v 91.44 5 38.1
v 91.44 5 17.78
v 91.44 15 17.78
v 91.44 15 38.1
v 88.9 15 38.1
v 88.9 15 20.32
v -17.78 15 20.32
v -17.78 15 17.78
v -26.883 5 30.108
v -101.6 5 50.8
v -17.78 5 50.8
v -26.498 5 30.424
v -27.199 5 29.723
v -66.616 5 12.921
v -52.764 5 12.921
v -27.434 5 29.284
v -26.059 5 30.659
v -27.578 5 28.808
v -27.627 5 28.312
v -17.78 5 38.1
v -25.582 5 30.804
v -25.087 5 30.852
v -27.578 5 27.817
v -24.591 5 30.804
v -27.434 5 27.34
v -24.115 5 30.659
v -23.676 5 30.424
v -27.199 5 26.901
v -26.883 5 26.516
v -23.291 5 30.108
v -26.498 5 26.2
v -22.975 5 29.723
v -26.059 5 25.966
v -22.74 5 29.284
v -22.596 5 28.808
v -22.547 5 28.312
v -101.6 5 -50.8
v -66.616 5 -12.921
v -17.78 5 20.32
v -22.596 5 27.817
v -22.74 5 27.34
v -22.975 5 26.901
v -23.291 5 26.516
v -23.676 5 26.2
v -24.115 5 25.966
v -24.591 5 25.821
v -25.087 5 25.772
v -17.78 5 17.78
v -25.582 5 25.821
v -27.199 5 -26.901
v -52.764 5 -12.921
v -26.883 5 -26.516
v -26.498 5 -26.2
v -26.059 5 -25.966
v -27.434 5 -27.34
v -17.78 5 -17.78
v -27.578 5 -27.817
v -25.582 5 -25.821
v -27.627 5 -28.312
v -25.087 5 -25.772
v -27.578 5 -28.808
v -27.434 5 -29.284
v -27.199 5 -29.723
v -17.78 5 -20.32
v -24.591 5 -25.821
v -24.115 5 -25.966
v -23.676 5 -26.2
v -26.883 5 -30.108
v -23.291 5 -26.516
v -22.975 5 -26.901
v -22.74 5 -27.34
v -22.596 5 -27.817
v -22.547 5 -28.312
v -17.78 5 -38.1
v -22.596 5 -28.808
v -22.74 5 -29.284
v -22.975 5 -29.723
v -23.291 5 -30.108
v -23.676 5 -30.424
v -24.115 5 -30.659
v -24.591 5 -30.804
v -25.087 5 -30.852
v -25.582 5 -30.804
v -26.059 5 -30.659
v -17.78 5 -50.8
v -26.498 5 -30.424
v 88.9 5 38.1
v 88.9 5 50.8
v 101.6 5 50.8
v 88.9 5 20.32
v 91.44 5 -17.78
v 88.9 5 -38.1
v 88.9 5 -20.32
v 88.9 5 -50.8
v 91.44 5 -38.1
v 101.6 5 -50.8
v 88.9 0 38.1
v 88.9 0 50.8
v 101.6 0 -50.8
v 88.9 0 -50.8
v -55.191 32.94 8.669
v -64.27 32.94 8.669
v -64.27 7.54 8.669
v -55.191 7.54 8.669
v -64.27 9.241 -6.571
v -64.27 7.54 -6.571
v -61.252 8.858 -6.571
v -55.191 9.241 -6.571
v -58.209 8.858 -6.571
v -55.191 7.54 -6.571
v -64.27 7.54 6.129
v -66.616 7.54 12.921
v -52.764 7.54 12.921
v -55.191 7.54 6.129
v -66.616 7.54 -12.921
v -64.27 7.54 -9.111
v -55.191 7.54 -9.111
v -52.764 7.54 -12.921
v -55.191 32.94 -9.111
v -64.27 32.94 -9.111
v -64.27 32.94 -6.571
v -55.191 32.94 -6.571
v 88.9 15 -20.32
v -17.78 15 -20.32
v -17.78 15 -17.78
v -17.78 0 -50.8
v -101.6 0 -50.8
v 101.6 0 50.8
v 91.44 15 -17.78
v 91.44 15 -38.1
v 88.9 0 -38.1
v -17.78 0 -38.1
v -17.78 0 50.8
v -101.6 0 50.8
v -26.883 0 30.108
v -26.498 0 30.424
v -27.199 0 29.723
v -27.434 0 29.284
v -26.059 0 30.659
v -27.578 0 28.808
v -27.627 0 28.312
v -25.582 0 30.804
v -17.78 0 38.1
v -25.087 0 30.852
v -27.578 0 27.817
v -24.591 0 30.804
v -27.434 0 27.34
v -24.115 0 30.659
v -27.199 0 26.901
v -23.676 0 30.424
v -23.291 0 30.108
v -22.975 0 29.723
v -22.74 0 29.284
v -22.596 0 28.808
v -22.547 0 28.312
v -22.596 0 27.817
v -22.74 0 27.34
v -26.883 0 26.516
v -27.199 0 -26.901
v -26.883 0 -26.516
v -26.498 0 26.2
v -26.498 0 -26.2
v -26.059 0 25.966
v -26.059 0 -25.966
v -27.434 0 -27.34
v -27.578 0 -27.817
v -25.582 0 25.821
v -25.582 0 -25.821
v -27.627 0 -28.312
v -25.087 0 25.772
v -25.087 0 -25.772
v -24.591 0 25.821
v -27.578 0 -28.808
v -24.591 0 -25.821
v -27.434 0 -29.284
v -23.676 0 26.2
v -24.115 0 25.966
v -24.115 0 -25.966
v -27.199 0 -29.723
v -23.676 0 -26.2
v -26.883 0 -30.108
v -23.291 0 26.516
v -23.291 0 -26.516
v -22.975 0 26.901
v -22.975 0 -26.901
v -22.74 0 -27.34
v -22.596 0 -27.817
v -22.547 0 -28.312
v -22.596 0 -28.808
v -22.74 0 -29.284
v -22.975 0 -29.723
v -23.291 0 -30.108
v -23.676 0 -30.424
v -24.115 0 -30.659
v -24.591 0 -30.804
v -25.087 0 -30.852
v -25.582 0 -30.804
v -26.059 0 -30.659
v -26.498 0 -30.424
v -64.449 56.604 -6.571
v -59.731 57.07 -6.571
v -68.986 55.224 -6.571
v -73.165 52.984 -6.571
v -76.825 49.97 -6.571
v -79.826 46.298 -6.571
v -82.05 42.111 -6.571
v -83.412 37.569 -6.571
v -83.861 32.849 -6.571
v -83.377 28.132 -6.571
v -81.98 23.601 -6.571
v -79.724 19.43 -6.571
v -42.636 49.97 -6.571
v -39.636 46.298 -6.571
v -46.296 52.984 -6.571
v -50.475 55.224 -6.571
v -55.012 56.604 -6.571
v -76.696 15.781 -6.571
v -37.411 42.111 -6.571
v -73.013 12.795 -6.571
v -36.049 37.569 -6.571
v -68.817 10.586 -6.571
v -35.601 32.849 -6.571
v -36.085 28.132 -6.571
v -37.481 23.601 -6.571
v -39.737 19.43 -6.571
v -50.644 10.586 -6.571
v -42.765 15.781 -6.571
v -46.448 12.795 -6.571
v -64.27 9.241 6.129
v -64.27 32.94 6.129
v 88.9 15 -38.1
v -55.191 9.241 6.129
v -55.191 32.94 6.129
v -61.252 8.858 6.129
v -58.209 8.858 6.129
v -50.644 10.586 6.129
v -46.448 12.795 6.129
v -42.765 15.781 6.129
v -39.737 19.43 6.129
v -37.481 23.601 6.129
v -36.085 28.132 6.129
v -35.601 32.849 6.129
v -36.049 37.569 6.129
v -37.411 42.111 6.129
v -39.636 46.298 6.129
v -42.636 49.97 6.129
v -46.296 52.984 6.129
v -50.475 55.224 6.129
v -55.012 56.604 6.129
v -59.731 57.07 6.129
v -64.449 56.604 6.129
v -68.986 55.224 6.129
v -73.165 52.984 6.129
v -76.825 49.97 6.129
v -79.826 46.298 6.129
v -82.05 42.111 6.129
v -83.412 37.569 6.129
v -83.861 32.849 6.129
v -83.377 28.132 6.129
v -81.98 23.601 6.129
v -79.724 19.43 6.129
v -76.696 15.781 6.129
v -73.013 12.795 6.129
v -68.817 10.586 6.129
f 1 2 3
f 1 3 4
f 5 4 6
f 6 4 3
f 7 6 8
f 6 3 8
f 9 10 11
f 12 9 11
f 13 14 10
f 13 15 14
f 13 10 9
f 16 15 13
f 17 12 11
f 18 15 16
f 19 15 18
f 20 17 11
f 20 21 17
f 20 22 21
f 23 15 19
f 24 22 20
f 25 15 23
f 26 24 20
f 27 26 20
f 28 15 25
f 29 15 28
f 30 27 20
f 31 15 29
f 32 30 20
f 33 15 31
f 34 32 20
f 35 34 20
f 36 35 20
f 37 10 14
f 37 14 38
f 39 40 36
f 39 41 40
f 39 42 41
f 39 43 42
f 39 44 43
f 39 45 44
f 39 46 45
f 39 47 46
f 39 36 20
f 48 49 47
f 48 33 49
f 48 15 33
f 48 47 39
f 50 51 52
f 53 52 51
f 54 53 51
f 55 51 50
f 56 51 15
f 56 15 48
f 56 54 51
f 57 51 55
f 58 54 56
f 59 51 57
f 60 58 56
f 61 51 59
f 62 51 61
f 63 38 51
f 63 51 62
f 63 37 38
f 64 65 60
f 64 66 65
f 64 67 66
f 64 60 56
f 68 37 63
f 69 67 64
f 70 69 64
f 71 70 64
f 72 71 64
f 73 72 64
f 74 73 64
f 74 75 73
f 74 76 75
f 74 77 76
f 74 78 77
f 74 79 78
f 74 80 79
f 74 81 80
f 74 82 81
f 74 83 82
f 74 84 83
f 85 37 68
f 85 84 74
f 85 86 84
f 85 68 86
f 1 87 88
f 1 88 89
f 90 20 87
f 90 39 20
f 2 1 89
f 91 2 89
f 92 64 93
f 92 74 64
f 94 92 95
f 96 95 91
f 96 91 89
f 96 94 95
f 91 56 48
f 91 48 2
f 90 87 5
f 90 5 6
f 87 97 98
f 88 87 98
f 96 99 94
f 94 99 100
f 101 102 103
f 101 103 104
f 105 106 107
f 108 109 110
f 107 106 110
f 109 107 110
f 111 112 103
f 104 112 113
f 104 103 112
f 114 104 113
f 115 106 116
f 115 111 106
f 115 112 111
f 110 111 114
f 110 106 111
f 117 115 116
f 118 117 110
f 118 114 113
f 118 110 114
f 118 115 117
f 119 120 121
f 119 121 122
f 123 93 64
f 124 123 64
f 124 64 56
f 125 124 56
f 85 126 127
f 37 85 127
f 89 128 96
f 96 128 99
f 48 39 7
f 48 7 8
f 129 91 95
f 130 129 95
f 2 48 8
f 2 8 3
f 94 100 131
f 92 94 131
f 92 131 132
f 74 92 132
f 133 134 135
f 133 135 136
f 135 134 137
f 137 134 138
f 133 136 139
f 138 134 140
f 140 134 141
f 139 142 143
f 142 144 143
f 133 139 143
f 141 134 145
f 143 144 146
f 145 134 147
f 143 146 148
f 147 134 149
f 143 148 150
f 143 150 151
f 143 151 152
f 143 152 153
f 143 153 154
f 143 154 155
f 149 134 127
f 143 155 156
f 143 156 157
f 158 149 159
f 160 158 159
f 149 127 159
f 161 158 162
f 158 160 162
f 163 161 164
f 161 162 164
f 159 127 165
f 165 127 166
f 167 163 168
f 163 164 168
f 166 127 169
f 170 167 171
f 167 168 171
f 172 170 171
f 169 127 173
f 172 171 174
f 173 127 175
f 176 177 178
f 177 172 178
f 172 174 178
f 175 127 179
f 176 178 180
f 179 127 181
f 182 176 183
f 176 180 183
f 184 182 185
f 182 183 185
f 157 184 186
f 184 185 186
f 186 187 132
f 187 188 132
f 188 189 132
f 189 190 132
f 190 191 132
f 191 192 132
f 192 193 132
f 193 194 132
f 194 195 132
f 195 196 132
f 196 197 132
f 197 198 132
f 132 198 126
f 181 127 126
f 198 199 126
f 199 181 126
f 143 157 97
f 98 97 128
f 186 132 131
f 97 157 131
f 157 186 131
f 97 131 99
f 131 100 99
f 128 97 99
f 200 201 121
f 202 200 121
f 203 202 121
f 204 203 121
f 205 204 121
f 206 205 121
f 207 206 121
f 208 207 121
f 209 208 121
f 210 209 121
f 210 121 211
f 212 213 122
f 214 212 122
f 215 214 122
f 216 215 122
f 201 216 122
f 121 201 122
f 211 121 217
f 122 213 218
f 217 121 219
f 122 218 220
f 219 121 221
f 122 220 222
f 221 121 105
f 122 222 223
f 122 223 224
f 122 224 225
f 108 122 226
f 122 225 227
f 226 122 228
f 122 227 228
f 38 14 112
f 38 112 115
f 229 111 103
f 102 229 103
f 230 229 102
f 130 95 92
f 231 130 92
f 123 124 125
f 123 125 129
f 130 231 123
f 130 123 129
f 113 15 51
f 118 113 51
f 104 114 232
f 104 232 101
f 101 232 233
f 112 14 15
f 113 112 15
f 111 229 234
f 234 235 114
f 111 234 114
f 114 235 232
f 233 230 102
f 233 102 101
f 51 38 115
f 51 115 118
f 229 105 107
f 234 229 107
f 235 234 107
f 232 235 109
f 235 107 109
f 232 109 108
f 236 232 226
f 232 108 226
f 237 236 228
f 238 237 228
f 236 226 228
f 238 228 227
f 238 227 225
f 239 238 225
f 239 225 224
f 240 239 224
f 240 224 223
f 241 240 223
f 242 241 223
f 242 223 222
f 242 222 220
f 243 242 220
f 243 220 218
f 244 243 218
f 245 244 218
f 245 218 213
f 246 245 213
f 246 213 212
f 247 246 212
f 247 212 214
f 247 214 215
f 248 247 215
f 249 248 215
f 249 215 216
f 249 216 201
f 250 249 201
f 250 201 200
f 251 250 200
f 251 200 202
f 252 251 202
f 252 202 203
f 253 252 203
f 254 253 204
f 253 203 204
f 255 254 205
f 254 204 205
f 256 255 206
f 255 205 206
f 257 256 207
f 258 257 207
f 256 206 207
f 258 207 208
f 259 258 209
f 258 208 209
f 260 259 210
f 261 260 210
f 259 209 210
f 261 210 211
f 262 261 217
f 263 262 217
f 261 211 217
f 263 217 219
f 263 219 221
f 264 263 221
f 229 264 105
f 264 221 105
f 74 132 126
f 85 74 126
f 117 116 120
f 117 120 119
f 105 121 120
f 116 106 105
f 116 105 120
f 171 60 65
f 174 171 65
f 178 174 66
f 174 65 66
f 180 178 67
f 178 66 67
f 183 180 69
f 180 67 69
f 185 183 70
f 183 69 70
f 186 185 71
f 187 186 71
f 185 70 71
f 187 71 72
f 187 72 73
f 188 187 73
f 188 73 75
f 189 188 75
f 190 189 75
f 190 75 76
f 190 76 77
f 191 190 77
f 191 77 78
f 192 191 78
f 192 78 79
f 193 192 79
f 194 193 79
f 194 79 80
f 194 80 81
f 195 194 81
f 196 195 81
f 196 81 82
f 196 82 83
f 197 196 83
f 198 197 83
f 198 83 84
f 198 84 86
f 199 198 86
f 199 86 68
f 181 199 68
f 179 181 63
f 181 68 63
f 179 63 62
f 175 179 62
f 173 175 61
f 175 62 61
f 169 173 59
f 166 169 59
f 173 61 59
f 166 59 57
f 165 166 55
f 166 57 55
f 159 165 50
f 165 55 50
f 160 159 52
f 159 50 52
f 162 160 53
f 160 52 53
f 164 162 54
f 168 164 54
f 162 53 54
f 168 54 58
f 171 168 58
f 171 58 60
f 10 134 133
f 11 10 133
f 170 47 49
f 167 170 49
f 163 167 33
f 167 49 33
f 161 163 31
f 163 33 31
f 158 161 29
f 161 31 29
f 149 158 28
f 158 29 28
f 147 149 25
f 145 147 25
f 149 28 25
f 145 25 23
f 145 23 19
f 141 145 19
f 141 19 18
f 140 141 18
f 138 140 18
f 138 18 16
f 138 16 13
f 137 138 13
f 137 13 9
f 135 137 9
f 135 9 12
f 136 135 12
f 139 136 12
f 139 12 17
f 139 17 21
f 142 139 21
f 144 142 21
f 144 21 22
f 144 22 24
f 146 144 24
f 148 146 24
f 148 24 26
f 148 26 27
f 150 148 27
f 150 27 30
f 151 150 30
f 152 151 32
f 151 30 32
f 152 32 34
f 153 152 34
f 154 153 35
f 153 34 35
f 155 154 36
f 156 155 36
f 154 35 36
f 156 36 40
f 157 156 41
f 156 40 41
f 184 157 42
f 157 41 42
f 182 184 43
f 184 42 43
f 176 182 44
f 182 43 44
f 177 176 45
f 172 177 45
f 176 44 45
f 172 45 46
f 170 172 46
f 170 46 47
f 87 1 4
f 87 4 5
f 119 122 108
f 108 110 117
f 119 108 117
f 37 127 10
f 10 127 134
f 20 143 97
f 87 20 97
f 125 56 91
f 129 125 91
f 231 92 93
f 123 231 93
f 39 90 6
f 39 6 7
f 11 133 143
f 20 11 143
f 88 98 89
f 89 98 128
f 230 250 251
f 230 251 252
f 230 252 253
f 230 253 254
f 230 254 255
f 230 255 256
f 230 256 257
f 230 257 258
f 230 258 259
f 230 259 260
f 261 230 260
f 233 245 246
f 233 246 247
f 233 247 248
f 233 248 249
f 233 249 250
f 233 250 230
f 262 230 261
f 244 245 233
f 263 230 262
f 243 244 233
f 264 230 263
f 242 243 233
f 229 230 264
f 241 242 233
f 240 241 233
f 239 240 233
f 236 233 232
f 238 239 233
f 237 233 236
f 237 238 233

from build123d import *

# Parameters (mm, degrees)
BOSS_EXTRUDE1_DEPTH  = 5
BOSS_EXTRUDE2_DEPTH  = 10
SKETCH3_R            = 2.54
CUT_EXTRUDE1_DEPTH   = 115.031574575
SKETCH5_W            = 13.851899184
SKETCH5_H            = 25.842671822
BOSS_EXTRUDE3_DEPTH  = 2.54
SKETCH6_W            = 9.079065489
SKETCH6_H            = 2.54
BOSS_EXTRUDE7_DEPTH  = 25.4
SKETCH9_R            = 24.13
BOSS_EXTRUDE10_DEPTH = 12.7
SKETCH12_W           = 9.079065489
SKETCH12_H           = 25.611184956
BOSS_EXTRUDE11_DEPTH = 2.54


with BuildPart() as part:
    # Sketch1 → Boss-Extrude1 (new body)
    with BuildSketch(Plane(origin=(0, 0, 0), x_dir=(1, 0, 0), z_dir=(0, 1, 0))):
        Polygon((101.6, 50.8), (88.9, 50.8), (88.9, 38.1), (-17.78, 38.1), (-17.78, 50.8), (-101.6, 50.8), (-101.6, -50.8), (-17.78, -50.8), (-17.78, -38.1), (88.9, -38.1), (88.9, -50.8), (101.6, -50.8), align=None)
    extrude(amount=BOSS_EXTRUDE1_DEPTH)

    # Sketch2 → Boss-Extrude2 (add)
    with BuildSketch(Plane(origin=(0, 5, 0), x_dir=(1, 0, 0), z_dir=(0, 1, 0))):
        Polygon((88.9, -38.1), (88.9, -20.32), (-17.78, -20.32), (-17.78, -17.78), (91.44, -17.78), (91.44, -38.1), align=None)
        Polygon((91.44, 17.78), (91.44, 38.1), (88.9, 38.1), (88.9, 20.32), (-17.78, 20.32), (-17.78, 17.78), align=None)
    extrude(amount=BOSS_EXTRUDE2_DEPTH)

    # Sketch3 → Cut-Extrude1 (cut, through all)
    with BuildSketch(Plane(origin=(0, 5, 0), x_dir=(1, 0, 0), z_dir=(0, 1, 0))):
        with Locations((-25.086891482, 28.312348959)):
            Circle(SKETCH3_R)
        with Locations((-25.086891482, -28.312348959)):
            Circle(SKETCH3_R)
    extrude(amount=-CUT_EXTRUDE1_DEPTH, mode=Mode.SUBTRACT)

    # Sketch5 → Boss-Extrude3 (add)
    with BuildSketch(Plane(origin=(0, 5, 0), x_dir=(1, 0, 0), z_dir=(0, 1, 0))):
        with Locations((-59.69, 0)):
            Rectangle(SKETCH5_W, SKETCH5_H)
    extrude(amount=BOSS_EXTRUDE3_DEPTH)

    # Sketch6 → Boss-Extrude7 (add)
    with BuildSketch(Plane(origin=(0, 7.54, 0), x_dir=(1, 0, 0), z_dir=(0, 1, 0))):
        with Locations((-59.730694006, 7.841335911)):
            Rectangle(SKETCH6_W, SKETCH6_H)
    extrude(amount=BOSS_EXTRUDE7_DEPTH)

    # Sketch9 → Boss-Extrude10 (add)
    with BuildSketch(Plane.XY.offset(-6.571335911)):
        with Locations((-59.730694006, 32.94)):
            Circle(SKETCH9_R)
    extrude(amount=BOSS_EXTRUDE10_DEPTH)

    # Sketch12 → Boss-Extrude11 (add)
    with BuildSketch(Plane.XY.offset(6.128664089)):
        with Locations((-59.730694006, 20.134407522)):
            Rectangle(SKETCH12_W, SKETCH12_H)
    extrude(amount=BOSS_EXTRUDE11_DEPTH)


solid = part.part
